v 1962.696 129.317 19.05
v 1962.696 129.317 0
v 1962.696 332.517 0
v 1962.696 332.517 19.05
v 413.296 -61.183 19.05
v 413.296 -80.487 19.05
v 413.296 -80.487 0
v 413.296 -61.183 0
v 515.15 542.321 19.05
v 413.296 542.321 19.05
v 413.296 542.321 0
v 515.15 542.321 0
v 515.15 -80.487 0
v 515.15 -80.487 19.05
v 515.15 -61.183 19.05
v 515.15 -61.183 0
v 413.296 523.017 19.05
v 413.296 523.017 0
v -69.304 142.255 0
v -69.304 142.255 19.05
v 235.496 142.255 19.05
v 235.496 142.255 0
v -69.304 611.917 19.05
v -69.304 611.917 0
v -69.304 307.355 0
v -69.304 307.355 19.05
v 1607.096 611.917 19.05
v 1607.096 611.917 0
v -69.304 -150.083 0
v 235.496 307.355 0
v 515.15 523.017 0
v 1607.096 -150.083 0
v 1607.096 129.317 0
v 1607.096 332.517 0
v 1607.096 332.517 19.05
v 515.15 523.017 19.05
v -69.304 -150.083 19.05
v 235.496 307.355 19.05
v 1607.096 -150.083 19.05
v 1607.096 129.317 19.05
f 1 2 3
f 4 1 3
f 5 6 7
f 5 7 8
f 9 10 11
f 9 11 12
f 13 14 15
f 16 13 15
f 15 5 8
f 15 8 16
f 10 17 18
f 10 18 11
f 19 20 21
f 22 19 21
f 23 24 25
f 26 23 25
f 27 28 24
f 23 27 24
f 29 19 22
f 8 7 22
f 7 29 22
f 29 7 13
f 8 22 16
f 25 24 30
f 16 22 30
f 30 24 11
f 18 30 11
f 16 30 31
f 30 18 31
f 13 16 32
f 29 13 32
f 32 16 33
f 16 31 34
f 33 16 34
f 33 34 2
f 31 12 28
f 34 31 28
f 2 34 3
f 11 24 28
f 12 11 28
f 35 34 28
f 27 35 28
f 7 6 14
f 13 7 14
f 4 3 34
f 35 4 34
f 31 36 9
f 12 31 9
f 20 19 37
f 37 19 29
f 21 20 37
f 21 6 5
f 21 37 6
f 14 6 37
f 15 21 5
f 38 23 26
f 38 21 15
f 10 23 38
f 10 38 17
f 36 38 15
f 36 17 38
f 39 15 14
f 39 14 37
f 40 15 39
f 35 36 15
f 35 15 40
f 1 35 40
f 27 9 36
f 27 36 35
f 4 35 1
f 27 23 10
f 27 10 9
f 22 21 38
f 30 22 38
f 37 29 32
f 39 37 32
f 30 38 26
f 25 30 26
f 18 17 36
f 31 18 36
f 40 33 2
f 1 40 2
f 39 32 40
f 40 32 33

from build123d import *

# Parameters (mm, degrees)
F1_DEPTH = 19.05
F2_W     = 101.854
F2_H     = 19.304
F3_DEPTH = 25.4


# Not quite as in the source:
# - a feature names something its author has since deleted; it is built from what else it names


with BuildPart() as f1:
    # F0 (on Top) → F1 (new body)
    with BuildSketch(Plane.XY):
        Polygon((-69.3041831255, 0), (-69.3041831255, -150.0828219056), (1607.0958168745, -150.0828219056), (1607.0958168745, 129.3171780944), (1962.6958168745, 129.3171780944), (1962.6958168745, 332.5171780944), (1607.0958168745, 332.5171780944), (1607.0958168745, 611.9171780944), (-69.3041831255, 611.9171780944), align=None)
    extrude(amount=F1_DEPTH)

    # F2 (on face) → F3 (cut)
    with BuildSketch(Plane.XY.offset(19.05)):
        with Locations((464.2228168745, 532.6691780944)):
            Rectangle(F2_W, F2_H)
        with Locations((464.2228168745, -70.8348219056)):
            Rectangle(F2_W, F2_H)
        Polygon((-69.3041831255, 307.3549188137), (-69.3041831255, 224.8049188137), (-69.3041831255, 142.2549188137), (235.4958168745, 142.2549188137), (235.4958168745, 307.3549188137), align=None)
    extrude(amount=-F3_DEPTH, mode=Mode.SUBTRACT)


solid = f1.part
